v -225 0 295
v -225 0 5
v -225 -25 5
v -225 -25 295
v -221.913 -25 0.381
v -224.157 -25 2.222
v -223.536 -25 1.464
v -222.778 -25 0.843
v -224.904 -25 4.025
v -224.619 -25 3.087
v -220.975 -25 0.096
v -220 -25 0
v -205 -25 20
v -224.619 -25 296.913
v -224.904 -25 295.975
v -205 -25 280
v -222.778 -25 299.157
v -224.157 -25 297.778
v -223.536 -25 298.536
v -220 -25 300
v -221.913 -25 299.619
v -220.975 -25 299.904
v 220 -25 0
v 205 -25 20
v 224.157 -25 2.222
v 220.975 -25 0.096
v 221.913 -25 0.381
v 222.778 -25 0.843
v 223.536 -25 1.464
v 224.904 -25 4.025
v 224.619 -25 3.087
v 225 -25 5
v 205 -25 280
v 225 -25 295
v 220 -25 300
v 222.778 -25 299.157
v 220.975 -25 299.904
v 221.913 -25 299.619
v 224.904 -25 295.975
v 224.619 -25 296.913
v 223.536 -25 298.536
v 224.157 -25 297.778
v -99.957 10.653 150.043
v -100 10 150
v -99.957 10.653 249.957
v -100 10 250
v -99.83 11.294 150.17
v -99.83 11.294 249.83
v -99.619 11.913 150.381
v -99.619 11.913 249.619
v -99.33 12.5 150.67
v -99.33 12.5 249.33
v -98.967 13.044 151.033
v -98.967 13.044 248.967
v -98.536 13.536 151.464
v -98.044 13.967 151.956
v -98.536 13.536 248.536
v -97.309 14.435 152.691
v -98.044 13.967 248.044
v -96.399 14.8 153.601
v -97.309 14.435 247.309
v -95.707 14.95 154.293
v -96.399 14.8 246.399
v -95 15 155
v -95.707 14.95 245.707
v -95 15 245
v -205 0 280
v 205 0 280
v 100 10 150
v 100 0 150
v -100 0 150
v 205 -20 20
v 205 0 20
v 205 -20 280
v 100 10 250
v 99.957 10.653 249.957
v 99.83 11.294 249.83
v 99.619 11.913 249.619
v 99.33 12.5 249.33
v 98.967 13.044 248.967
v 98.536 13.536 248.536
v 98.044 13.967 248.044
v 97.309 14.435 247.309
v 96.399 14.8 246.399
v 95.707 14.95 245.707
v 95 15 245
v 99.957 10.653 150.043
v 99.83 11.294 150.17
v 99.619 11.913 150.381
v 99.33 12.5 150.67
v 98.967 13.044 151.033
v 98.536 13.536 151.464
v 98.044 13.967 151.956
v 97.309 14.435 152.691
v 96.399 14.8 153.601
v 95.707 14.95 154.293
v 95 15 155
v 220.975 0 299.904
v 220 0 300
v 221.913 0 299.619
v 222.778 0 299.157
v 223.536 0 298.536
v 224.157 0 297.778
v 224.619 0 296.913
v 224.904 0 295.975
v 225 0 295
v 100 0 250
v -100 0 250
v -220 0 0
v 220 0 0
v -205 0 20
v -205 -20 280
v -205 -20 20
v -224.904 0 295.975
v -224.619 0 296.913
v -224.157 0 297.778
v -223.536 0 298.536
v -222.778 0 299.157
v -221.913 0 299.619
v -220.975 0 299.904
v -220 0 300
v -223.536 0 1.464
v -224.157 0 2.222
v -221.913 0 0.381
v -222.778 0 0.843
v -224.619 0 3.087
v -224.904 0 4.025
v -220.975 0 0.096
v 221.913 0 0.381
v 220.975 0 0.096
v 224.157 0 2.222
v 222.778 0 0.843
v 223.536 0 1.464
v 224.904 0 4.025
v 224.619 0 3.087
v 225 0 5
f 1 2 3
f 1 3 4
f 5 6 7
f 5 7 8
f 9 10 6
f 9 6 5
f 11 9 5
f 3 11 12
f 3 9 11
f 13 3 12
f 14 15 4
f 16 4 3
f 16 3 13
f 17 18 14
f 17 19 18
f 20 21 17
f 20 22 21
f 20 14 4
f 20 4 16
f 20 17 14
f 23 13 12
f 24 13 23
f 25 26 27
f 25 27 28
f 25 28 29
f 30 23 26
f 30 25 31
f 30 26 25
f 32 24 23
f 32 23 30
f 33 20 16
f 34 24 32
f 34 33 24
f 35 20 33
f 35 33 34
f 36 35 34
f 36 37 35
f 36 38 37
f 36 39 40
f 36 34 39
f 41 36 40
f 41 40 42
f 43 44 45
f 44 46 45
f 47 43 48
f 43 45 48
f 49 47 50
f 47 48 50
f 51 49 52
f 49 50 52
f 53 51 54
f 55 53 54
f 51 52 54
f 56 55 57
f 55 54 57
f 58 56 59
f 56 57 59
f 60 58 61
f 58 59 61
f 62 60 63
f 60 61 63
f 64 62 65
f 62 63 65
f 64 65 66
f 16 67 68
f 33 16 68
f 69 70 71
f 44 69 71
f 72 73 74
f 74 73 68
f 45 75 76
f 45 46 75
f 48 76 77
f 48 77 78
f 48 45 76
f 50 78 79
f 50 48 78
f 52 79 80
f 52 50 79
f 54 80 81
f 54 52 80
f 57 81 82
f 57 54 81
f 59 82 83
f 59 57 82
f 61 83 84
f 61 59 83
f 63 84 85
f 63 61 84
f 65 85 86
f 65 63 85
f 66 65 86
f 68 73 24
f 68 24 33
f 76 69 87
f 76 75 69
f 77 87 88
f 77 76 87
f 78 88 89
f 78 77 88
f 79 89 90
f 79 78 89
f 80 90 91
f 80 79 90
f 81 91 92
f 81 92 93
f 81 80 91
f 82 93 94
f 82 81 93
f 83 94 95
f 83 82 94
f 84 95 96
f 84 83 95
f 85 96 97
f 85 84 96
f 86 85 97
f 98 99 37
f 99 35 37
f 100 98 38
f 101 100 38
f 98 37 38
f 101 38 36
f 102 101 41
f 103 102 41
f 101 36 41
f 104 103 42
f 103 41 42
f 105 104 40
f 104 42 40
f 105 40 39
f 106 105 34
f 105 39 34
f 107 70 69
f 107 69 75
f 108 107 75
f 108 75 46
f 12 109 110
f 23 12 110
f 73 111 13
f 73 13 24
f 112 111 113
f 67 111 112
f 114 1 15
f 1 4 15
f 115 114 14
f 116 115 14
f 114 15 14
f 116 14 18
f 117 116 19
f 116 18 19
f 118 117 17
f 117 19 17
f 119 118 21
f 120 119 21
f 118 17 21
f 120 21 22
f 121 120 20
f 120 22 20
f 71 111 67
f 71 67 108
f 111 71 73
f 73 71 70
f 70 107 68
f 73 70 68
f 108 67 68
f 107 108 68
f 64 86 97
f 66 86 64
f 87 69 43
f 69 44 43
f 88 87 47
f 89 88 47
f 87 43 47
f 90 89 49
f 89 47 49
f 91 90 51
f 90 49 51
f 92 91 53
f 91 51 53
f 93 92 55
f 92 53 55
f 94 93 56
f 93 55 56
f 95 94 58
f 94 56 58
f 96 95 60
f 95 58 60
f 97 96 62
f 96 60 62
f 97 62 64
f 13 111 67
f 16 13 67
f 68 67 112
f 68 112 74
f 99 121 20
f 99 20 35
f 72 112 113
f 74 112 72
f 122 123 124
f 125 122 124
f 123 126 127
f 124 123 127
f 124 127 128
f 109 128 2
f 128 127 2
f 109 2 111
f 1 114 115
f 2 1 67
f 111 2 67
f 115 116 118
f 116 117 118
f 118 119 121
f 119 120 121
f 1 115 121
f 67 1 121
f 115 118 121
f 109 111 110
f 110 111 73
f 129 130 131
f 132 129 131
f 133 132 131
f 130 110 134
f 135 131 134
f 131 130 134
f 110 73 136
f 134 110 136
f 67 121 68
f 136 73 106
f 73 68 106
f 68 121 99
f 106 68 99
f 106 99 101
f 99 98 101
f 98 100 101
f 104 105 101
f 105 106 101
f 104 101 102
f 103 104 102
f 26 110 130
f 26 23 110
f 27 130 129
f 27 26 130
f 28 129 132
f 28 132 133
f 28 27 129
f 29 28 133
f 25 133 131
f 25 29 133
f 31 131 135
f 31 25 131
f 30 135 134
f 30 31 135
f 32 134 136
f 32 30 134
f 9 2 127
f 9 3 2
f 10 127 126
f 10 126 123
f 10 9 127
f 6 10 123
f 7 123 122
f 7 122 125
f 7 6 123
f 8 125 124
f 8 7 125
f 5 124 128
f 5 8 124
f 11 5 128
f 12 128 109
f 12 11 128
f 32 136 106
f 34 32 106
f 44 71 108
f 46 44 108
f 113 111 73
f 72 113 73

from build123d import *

# Parameters (mm, degrees)
F0_W     = 410
F0_H     = 260
F1_DEPTH = 20
F0_W_2   = 450
F0_H_2   = 300
F2_DEPTH = 25
F3_R     = 5
F4_W     = 200
F4_H     = 100
F5_DEPTH = 15
F6_R     = 5


with BuildPart() as f1:
    # F0 (on Front) → F1 (new body)
    with BuildSketch(Plane.XZ):
        with Locations((0, 150)):
            Rectangle(F0_W, F0_H)
    extrude(amount=F1_DEPTH)

    # F4 (on face) → F5 (join)
    with BuildSketch(Plane(origin=(0, 0, 0), x_dir=(-1, 0, 0), z_dir=(0, 1, 0))):
        with Locations((-4e-06, 200)):
            Rectangle(F4_W, F4_H)
    extrude(amount=F5_DEPTH)

    # F6
    f6_edges = [f1.edges().sort_by_distance(p)[0] for p in [
        (-99.999996, 15, 200),
        (4e-06, 15, 250),
        (100.000004, 15, 200),
        (4e-06, 15, 150),
    ]]
    fillet(f6_edges, radius=F6_R)


with BuildPart() as f2:
    # F0 (on Front) → F2 (new body)
    with BuildSketch(Plane.XZ):
        with Locations((0, 150)):
            Rectangle(F0_W_2, F0_H_2)
        with Locations((0, 150)):
            Rectangle(F0_W, F0_H, mode=Mode.SUBTRACT)
    extrude(amount=F2_DEPTH)

    # F3
    f3_edges = [f2.edges().sort_by_distance(p)[0] for p in [
        (-225, -12.5, 300),
        (225, -12.5, 300),
        (225, -12.5, 0),
        (-225, -12.5, 0),
    ]]
    fillet(f3_edges, radius=F3_R)


solid = Compound([f1.part, f2.part])
